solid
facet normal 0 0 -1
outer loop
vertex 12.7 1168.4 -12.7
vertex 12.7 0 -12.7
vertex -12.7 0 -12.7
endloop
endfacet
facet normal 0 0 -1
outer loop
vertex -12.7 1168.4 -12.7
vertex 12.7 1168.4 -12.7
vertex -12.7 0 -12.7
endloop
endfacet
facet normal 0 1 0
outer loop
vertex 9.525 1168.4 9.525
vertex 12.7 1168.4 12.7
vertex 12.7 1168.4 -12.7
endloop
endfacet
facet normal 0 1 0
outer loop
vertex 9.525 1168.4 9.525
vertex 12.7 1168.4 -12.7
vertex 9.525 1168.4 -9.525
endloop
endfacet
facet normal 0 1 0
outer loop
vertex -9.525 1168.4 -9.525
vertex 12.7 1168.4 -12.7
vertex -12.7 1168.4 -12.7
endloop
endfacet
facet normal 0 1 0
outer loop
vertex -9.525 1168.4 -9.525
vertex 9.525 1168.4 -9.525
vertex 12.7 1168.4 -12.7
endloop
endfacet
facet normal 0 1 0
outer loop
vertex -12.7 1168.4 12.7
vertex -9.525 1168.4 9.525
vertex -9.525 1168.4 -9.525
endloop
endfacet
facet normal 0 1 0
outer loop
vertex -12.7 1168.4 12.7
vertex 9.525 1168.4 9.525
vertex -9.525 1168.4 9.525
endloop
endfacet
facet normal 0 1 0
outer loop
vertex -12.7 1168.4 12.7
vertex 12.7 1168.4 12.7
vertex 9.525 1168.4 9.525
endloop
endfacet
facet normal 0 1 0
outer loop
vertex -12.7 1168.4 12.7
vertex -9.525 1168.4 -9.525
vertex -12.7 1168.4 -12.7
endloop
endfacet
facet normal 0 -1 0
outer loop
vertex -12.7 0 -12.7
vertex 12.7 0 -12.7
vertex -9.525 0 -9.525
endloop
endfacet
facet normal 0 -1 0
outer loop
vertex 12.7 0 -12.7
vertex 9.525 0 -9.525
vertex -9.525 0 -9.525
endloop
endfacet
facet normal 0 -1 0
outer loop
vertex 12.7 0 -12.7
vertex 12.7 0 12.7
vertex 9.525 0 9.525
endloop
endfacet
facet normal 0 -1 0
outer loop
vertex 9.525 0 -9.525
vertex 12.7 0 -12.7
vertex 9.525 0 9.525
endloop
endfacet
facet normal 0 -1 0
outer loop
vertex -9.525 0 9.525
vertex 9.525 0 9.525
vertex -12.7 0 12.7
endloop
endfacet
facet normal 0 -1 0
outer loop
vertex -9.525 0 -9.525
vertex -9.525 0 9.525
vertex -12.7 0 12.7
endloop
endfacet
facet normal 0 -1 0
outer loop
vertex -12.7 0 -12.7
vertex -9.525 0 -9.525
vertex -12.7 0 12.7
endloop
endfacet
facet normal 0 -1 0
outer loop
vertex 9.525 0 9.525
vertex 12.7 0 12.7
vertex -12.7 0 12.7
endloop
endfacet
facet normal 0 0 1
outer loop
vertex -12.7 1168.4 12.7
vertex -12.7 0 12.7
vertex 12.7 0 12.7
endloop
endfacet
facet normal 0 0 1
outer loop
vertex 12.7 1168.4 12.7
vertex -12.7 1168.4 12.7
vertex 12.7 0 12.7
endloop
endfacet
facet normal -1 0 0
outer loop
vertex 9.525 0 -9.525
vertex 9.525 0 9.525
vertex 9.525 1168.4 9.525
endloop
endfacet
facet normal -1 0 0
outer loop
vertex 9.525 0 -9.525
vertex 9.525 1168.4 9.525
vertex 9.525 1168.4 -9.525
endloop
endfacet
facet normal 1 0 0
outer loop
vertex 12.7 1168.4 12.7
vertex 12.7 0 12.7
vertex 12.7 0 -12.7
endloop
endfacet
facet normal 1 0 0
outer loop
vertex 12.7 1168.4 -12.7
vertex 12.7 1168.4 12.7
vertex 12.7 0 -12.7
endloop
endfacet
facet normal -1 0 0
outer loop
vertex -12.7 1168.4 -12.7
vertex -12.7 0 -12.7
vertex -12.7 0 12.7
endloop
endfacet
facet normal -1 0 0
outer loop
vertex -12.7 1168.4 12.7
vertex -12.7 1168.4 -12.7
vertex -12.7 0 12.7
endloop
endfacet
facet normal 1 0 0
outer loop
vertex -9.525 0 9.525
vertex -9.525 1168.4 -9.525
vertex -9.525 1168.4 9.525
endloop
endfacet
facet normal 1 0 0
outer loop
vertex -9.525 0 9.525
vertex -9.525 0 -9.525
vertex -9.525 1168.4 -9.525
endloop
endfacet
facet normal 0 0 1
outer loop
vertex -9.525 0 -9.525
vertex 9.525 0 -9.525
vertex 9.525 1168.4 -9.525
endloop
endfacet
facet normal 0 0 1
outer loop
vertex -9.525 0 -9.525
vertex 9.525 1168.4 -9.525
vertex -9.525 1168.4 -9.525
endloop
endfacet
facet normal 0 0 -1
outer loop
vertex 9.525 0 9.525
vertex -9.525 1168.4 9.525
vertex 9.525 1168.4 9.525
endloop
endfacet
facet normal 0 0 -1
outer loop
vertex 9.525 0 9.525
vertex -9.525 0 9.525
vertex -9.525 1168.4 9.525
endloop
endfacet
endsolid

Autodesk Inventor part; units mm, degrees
ref_plane "YZ Plane" through (0, 0, 0) normal (1, 0, 0) x (0, 1, 0)
ref_plane "XZ Plane" through (0, 0, 0) normal (0, 1, 0) x (-1, 0, 0)
ref_plane "XY Plane" through (0, 0, 0) normal (0, 0, 1) x (1, 0, 0)
sketch "Sketch1" plane through (0, 0, 0) normal (0, 1, 0) x (-1, 0, 0)
  line L0 (12.7, 12.7) -> (-12.7, 12.7)
  line L1 (-12.7, 12.7) -> (-12.7, -12.7)
  line L2 (-12.7, -12.7) -> (12.7, -12.7)
  line L3 (12.7, -12.7) -> (12.7, 12.7)
  line L4 (12.7, 12.7) -> (-12.7, -12.7) construction
  line L5 (-12.7, 12.7) -> (12.7, -12.7) construction
  line L6 (9.525, 9.525) -> (-9.525, 9.525)
  line L7 (-9.525, 9.525) -> (-9.525, -9.525)
  line L8 (-9.525, -9.525) -> (9.525, -9.525)
  line L9 (9.525, -9.525) -> (9.525, 9.525)
  line L10 (9.525, 9.525) -> (-9.525, -9.525) construction
  line L11 (-9.525, 9.525) -> (9.525, -9.525) construction
  point P0 (0, 0)
  dimension "d0" = 25.4
  dimension "d1" = 3.175
extrude "Extrusion1" add sketch "Sketch1" along normal blind 1168.4
properties part number "1x46-rectangular"
